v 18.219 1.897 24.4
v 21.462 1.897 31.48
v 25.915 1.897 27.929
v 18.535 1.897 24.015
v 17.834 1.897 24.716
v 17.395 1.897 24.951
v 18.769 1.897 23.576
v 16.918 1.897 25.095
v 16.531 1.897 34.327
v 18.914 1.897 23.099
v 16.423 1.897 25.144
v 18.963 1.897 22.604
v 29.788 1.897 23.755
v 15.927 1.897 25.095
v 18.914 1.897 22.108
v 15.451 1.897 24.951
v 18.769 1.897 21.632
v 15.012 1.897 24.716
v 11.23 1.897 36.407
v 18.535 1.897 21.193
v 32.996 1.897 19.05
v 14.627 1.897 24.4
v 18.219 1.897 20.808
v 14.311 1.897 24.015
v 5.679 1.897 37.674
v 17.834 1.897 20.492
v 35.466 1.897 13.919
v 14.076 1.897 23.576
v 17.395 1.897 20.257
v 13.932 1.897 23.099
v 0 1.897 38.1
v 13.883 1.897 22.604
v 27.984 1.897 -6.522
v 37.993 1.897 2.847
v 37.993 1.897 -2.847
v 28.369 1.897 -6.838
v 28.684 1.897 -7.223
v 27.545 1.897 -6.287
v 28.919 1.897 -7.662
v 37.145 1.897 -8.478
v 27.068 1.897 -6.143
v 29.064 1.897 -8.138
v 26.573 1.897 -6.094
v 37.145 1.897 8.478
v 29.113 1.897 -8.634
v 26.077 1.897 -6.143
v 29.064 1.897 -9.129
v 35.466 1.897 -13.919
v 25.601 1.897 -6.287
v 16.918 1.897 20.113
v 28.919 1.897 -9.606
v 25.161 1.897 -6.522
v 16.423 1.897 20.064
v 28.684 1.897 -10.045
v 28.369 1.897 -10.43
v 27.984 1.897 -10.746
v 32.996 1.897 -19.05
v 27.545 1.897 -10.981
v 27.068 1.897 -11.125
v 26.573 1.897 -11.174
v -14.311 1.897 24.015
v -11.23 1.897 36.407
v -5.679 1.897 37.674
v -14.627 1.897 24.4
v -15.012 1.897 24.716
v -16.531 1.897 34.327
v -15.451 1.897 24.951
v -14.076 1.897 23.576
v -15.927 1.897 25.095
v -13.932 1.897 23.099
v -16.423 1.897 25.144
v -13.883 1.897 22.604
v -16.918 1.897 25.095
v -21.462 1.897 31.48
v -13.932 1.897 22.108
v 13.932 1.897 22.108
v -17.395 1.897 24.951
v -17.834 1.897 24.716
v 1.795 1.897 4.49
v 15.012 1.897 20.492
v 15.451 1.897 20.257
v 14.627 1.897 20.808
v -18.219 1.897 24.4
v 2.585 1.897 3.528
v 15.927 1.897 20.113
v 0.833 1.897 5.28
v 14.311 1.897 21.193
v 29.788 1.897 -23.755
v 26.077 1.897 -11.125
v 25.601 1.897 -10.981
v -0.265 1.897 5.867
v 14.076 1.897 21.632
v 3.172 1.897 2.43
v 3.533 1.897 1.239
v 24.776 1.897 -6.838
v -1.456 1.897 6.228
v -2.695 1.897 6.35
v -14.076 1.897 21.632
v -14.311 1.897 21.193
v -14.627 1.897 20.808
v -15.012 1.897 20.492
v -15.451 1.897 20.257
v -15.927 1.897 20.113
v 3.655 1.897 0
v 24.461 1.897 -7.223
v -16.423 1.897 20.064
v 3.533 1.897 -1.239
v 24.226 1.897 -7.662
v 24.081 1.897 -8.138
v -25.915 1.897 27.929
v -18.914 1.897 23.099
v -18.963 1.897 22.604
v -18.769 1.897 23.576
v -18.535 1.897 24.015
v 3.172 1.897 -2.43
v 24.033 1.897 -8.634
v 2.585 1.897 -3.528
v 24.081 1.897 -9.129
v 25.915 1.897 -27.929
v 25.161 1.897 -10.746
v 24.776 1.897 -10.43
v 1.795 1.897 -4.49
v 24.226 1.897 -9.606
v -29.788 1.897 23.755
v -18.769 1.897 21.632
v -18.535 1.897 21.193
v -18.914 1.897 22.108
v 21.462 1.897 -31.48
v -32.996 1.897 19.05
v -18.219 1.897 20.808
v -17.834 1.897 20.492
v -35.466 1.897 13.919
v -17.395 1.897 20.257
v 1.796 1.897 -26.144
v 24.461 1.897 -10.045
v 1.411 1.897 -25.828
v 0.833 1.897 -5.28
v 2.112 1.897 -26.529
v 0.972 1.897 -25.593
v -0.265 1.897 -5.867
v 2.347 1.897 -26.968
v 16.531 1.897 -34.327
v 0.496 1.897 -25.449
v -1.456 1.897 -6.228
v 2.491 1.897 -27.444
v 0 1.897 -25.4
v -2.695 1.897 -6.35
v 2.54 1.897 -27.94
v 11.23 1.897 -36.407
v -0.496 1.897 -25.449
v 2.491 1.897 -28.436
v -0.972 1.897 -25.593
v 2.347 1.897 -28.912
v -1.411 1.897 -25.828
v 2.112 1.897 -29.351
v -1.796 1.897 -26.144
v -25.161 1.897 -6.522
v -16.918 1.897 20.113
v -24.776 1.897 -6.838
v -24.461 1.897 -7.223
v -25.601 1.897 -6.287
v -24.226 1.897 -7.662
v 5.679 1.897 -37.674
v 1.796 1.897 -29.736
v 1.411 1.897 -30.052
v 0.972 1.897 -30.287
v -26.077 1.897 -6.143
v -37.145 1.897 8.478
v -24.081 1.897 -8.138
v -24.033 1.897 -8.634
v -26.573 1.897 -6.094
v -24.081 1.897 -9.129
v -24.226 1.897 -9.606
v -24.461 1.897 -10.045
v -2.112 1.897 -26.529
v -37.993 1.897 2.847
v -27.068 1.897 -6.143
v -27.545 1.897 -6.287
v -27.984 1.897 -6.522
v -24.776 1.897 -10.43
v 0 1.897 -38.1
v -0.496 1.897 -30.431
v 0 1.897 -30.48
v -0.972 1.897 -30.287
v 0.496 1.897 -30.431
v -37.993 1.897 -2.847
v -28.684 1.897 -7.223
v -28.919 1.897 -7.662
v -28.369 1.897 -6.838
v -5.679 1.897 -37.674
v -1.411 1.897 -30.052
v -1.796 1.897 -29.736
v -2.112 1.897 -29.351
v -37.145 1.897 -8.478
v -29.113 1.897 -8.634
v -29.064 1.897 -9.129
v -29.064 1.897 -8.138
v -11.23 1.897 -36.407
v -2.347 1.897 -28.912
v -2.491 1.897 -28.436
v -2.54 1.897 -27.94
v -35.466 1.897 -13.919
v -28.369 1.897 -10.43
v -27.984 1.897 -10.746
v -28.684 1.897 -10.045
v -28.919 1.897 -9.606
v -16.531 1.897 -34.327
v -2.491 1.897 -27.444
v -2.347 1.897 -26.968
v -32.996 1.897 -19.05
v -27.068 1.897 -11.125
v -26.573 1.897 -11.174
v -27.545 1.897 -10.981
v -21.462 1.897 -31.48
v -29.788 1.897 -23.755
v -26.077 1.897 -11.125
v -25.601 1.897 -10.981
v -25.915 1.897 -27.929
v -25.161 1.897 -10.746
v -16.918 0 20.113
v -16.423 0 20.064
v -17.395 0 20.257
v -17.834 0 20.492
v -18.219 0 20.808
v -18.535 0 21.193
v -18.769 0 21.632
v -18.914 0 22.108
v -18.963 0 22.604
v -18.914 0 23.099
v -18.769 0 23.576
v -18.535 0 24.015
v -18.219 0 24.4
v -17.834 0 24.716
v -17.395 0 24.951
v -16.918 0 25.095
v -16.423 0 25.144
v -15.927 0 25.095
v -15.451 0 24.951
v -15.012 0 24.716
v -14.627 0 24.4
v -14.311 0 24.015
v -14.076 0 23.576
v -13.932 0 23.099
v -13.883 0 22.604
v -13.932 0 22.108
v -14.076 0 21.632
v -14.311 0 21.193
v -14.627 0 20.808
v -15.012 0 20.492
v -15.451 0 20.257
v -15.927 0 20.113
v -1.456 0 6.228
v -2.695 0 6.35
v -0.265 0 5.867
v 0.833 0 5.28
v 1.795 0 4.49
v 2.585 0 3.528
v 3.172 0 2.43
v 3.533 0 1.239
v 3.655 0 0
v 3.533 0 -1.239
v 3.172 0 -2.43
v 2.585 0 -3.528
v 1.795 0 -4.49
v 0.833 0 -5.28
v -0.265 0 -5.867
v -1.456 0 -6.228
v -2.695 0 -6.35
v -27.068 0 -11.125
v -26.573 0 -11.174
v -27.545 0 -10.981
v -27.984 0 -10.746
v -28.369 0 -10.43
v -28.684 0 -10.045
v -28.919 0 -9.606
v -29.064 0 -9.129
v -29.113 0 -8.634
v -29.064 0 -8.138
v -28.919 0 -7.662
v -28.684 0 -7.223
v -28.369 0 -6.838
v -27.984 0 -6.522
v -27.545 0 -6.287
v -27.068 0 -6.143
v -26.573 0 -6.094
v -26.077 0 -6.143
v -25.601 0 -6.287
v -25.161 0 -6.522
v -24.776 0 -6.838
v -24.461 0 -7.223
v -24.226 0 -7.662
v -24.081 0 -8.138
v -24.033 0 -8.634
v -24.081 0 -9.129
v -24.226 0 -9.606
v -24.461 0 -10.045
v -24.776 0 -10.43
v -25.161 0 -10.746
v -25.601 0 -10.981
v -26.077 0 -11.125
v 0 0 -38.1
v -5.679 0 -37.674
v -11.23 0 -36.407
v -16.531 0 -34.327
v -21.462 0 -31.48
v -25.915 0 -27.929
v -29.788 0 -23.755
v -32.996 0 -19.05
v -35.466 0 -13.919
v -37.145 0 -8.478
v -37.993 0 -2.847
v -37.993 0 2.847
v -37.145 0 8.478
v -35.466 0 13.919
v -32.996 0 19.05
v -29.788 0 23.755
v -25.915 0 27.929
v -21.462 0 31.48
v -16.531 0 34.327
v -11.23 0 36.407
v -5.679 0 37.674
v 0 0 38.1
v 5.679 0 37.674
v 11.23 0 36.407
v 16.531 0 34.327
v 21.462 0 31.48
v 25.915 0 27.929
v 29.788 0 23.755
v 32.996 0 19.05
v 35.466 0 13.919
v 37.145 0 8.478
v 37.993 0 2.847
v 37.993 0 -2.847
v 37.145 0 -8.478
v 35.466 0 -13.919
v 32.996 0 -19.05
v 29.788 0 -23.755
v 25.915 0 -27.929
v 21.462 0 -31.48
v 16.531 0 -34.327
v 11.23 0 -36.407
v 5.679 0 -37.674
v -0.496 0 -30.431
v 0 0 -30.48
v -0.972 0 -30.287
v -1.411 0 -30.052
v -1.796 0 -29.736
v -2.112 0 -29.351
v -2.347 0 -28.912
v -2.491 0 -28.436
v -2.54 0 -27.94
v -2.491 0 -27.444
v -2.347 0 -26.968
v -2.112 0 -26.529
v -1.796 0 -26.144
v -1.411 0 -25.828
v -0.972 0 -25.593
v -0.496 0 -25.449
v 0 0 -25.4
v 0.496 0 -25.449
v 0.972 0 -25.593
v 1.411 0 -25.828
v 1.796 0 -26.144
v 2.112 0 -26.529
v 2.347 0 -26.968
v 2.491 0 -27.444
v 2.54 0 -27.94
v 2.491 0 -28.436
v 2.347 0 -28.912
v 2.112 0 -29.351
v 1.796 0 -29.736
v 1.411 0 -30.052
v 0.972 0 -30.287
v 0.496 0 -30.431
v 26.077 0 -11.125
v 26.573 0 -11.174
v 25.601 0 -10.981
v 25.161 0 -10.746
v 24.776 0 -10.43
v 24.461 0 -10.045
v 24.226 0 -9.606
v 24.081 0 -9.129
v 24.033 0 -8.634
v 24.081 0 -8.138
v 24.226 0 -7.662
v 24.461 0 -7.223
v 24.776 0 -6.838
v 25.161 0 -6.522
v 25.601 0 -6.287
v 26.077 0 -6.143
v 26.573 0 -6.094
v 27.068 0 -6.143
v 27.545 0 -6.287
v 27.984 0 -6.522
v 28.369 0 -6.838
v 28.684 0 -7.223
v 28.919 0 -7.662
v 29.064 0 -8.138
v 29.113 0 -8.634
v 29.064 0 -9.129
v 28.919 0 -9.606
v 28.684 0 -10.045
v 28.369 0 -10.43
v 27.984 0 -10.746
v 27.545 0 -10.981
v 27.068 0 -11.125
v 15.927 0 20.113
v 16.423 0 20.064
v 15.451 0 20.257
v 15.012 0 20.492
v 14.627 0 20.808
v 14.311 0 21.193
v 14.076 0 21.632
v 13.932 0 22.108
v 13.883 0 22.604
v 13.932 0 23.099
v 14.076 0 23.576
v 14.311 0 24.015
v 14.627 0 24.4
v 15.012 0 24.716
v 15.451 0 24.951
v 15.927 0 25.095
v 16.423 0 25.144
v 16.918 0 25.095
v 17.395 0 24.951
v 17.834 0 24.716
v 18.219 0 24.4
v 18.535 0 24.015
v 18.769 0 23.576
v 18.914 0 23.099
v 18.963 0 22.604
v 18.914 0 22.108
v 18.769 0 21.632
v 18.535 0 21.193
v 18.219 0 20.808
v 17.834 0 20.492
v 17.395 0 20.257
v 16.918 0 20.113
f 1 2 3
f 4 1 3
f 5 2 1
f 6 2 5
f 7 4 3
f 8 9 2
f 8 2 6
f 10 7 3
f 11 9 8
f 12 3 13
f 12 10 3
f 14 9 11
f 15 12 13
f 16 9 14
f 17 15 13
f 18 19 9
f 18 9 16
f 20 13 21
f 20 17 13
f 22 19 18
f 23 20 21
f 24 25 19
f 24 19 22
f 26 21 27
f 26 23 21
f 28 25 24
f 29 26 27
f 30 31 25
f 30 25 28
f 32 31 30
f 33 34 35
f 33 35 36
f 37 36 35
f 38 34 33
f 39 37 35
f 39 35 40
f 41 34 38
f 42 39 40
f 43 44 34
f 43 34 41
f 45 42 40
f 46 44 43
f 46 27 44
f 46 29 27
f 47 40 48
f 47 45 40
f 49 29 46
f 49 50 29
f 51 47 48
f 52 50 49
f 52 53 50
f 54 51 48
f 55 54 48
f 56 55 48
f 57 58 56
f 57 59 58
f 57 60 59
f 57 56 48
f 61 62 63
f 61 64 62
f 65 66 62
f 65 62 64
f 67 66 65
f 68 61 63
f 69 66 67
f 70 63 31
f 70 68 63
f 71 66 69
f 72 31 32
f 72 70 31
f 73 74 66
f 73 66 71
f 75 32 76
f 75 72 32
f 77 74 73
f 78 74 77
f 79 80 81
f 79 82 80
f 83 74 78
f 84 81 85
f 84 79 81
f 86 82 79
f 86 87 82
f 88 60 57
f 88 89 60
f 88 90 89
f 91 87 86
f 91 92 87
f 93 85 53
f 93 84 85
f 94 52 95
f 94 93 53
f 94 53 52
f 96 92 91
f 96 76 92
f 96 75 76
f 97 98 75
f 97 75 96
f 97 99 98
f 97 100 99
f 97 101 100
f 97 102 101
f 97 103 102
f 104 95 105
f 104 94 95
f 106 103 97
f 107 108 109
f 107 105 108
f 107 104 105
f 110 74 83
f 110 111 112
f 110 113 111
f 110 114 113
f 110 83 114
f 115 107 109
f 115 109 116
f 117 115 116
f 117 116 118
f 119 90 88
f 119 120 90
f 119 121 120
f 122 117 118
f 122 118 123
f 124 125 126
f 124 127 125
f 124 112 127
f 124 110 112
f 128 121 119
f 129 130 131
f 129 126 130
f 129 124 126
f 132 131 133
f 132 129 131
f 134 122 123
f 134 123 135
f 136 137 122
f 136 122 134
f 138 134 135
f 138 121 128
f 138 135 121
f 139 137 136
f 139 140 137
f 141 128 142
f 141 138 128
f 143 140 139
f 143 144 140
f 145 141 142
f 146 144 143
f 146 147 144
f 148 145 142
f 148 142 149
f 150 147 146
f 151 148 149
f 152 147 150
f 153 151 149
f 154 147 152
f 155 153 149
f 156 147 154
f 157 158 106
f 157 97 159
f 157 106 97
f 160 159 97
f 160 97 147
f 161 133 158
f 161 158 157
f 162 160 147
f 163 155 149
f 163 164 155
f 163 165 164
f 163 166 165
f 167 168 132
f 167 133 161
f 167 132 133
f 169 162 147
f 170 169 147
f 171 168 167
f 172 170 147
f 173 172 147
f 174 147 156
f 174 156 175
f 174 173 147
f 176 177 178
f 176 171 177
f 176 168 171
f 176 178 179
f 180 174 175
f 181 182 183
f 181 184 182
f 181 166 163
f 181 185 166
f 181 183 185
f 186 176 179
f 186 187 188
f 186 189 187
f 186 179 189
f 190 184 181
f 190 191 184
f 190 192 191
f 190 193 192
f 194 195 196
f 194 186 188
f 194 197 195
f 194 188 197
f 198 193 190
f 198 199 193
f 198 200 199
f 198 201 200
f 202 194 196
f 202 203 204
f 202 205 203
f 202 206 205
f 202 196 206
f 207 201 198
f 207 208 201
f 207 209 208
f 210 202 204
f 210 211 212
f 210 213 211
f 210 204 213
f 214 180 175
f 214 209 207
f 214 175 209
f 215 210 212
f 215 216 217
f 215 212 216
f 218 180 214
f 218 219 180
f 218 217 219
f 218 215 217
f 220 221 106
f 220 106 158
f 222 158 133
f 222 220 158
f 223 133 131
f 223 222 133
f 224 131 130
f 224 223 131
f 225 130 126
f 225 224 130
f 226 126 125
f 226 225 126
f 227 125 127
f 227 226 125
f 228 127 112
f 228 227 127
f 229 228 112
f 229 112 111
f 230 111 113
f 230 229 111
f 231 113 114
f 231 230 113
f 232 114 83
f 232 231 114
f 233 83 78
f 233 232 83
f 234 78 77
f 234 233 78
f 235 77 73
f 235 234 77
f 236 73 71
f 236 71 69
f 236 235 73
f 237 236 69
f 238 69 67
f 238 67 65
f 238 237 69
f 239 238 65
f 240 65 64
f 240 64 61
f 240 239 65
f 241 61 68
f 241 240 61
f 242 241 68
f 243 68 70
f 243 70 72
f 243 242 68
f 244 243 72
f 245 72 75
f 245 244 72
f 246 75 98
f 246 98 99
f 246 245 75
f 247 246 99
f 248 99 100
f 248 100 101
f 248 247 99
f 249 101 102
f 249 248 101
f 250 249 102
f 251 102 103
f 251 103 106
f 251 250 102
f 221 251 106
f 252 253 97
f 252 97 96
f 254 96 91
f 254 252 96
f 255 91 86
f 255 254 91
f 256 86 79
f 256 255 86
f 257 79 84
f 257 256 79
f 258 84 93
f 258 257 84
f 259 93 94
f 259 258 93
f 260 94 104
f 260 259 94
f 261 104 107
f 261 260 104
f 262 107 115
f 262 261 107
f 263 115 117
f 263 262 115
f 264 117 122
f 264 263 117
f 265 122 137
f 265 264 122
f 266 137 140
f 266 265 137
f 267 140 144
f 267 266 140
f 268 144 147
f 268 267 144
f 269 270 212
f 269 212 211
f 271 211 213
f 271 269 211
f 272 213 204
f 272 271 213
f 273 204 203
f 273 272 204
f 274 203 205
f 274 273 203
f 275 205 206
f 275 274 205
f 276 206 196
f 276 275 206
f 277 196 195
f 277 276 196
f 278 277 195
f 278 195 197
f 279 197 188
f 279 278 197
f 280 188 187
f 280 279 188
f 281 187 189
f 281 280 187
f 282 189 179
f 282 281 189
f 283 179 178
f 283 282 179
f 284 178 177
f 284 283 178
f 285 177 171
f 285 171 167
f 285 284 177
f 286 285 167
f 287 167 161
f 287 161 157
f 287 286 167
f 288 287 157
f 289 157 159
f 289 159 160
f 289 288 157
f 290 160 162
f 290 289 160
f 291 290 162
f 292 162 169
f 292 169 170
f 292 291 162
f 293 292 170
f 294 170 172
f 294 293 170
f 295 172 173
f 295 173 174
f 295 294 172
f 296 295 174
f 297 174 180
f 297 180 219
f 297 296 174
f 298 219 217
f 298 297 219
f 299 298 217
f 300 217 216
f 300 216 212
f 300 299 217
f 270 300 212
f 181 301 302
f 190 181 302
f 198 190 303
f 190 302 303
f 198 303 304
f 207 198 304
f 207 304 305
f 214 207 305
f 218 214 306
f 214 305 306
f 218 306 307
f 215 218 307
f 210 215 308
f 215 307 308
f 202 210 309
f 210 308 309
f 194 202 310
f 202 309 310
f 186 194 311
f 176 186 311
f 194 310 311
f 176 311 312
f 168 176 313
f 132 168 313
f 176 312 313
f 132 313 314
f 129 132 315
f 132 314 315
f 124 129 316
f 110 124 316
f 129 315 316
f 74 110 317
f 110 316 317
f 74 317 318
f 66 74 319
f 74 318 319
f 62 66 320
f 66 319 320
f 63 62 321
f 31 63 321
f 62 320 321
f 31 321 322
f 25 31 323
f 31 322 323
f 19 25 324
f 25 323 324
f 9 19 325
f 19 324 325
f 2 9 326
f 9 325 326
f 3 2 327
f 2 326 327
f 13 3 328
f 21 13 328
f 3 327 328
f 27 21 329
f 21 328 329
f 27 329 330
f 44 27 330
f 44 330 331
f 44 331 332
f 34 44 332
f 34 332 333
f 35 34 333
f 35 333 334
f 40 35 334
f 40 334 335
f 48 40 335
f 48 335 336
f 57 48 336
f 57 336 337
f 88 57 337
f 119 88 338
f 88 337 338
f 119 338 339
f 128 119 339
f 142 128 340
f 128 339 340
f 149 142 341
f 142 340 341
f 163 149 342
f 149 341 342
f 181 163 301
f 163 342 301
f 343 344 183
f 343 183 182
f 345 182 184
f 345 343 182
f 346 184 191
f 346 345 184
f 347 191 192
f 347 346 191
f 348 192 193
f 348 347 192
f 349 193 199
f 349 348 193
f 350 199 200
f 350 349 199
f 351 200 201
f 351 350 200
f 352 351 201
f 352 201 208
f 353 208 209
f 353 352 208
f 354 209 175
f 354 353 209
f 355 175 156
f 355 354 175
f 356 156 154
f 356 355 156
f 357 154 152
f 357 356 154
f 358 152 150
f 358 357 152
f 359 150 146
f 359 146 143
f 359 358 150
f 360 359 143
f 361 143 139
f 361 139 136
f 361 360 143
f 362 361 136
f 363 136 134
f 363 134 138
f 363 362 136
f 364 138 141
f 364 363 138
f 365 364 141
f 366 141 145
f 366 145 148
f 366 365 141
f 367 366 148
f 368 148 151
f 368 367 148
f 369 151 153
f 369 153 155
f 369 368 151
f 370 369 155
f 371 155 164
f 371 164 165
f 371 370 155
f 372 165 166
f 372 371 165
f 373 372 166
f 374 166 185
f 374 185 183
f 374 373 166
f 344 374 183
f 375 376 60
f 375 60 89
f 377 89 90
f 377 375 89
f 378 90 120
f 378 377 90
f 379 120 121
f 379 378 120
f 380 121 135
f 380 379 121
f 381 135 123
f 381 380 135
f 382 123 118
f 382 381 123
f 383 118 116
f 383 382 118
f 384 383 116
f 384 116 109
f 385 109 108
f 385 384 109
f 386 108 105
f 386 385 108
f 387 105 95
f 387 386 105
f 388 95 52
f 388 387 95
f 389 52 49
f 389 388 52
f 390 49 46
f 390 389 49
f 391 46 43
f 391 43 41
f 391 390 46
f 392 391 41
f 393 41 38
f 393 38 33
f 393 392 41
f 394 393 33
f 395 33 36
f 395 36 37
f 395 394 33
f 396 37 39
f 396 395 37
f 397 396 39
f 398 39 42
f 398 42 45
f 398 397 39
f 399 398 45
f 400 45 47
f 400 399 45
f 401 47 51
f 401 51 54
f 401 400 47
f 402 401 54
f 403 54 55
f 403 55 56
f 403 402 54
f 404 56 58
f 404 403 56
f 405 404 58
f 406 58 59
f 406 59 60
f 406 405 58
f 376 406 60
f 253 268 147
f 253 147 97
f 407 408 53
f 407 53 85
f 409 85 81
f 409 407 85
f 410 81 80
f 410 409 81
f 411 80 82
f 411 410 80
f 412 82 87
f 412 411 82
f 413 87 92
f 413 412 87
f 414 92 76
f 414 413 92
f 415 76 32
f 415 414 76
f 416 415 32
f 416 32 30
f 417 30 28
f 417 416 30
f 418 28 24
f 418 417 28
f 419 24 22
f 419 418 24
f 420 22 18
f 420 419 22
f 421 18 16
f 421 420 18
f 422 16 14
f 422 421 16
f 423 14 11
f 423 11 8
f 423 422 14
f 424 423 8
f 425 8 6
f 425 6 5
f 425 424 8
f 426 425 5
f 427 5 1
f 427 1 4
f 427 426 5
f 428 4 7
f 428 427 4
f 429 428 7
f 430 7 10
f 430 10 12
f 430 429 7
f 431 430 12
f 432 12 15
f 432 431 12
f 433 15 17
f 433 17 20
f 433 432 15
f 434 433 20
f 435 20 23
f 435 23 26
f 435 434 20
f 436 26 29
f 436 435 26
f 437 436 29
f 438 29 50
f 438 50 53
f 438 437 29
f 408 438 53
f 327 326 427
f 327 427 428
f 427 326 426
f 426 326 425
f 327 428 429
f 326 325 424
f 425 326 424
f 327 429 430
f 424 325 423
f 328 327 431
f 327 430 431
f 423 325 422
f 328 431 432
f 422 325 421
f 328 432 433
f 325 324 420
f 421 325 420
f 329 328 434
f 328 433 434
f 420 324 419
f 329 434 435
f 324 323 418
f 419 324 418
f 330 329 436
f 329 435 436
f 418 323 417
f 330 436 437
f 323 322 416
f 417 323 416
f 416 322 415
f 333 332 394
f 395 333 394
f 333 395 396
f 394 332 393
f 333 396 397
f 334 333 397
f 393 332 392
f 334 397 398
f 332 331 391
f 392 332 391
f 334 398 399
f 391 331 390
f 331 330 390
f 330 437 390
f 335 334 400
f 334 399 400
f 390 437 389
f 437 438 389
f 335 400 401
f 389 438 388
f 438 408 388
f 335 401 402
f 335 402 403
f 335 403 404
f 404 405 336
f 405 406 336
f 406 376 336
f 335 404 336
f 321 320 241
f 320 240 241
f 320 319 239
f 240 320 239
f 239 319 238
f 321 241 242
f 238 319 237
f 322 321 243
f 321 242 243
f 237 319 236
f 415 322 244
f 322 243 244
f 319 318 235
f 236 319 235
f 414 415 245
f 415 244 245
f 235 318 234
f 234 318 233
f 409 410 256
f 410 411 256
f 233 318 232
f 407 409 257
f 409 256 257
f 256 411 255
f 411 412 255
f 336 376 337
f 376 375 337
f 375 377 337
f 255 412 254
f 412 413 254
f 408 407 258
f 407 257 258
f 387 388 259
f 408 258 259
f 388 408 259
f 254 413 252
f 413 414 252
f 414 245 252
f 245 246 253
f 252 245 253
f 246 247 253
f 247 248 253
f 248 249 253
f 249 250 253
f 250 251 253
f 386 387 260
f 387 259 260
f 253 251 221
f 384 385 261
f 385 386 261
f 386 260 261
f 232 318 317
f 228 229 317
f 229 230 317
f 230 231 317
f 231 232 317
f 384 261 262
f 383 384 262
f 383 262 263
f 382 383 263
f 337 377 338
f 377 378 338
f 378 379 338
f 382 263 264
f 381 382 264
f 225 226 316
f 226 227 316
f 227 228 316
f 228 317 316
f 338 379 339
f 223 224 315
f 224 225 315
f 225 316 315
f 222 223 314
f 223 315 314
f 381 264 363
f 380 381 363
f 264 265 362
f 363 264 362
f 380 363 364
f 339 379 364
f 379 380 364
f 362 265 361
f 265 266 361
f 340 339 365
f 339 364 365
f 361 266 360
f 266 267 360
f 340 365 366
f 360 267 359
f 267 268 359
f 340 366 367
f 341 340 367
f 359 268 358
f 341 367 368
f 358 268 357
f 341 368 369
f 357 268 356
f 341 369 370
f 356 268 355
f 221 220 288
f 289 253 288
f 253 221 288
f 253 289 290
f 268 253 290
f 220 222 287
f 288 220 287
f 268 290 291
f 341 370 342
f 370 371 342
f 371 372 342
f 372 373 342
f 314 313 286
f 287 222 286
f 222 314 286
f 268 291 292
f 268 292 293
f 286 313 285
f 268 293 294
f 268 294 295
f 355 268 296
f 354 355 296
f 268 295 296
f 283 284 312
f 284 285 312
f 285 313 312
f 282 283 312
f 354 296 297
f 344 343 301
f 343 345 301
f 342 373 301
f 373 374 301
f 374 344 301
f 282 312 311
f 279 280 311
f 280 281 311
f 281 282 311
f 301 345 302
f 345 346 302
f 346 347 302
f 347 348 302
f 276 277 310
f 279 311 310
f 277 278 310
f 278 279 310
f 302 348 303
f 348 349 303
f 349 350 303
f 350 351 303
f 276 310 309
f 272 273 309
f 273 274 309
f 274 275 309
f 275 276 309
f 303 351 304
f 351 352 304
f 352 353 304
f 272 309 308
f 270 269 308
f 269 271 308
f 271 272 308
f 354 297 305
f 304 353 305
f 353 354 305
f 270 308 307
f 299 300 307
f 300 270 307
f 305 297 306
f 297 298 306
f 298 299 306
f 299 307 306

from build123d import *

# Parameters (mm, degrees)
SKETCH1_R           = 38.1
SKETCH1_R_2         = 2.54
BOSS_EXTRUDE1_DEPTH = 1.89738


with BuildPart() as part:
    # Sketch1 → Boss-Extrude1 (new body)
    with BuildSketch(Plane(origin=(0, 0, 0), x_dir=(1, 0, 0), z_dir=(0, 1, 0))):
        with Locations(Location((0, 0, 0), (0, 0, 90))):
            Circle(SKETCH1_R)
        with Locations(Location((0, 27.94, 0), (0, 0, 90))):
            Circle(SKETCH1_R_2, mode=Mode.SUBTRACT)
        with Locations(Location((26.572519065, 8.633934823, 0), (0, 0, 90))):
            Circle(SKETCH1_R_2, mode=Mode.SUBTRACT)
        with Locations(Location((16.422719949, -22.603934823, 0), (0, 0, 90))):
            Circle(SKETCH1_R_2, mode=Mode.SUBTRACT)
        with Locations(Location((-16.422719949, -22.603934823, 0), (0, 0, 90))):
            Circle(SKETCH1_R_2, mode=Mode.SUBTRACT)
        with Locations(Location((-26.572519065, 8.633934823, 0), (0, 0, 90))):
            Circle(SKETCH1_R_2, mode=Mode.SUBTRACT)
        with BuildLine():
            Line((-2.695023706, 6.35), (-2.695023706, -6.35))
            ThreePointArc((-2.695023706, -6.35), (3.654976294, 0), (-2.695023706, 6.35))
        make_face(mode=Mode.SUBTRACT)
    extrude(amount=BOSS_EXTRUDE1_DEPTH)


solid = part.part
